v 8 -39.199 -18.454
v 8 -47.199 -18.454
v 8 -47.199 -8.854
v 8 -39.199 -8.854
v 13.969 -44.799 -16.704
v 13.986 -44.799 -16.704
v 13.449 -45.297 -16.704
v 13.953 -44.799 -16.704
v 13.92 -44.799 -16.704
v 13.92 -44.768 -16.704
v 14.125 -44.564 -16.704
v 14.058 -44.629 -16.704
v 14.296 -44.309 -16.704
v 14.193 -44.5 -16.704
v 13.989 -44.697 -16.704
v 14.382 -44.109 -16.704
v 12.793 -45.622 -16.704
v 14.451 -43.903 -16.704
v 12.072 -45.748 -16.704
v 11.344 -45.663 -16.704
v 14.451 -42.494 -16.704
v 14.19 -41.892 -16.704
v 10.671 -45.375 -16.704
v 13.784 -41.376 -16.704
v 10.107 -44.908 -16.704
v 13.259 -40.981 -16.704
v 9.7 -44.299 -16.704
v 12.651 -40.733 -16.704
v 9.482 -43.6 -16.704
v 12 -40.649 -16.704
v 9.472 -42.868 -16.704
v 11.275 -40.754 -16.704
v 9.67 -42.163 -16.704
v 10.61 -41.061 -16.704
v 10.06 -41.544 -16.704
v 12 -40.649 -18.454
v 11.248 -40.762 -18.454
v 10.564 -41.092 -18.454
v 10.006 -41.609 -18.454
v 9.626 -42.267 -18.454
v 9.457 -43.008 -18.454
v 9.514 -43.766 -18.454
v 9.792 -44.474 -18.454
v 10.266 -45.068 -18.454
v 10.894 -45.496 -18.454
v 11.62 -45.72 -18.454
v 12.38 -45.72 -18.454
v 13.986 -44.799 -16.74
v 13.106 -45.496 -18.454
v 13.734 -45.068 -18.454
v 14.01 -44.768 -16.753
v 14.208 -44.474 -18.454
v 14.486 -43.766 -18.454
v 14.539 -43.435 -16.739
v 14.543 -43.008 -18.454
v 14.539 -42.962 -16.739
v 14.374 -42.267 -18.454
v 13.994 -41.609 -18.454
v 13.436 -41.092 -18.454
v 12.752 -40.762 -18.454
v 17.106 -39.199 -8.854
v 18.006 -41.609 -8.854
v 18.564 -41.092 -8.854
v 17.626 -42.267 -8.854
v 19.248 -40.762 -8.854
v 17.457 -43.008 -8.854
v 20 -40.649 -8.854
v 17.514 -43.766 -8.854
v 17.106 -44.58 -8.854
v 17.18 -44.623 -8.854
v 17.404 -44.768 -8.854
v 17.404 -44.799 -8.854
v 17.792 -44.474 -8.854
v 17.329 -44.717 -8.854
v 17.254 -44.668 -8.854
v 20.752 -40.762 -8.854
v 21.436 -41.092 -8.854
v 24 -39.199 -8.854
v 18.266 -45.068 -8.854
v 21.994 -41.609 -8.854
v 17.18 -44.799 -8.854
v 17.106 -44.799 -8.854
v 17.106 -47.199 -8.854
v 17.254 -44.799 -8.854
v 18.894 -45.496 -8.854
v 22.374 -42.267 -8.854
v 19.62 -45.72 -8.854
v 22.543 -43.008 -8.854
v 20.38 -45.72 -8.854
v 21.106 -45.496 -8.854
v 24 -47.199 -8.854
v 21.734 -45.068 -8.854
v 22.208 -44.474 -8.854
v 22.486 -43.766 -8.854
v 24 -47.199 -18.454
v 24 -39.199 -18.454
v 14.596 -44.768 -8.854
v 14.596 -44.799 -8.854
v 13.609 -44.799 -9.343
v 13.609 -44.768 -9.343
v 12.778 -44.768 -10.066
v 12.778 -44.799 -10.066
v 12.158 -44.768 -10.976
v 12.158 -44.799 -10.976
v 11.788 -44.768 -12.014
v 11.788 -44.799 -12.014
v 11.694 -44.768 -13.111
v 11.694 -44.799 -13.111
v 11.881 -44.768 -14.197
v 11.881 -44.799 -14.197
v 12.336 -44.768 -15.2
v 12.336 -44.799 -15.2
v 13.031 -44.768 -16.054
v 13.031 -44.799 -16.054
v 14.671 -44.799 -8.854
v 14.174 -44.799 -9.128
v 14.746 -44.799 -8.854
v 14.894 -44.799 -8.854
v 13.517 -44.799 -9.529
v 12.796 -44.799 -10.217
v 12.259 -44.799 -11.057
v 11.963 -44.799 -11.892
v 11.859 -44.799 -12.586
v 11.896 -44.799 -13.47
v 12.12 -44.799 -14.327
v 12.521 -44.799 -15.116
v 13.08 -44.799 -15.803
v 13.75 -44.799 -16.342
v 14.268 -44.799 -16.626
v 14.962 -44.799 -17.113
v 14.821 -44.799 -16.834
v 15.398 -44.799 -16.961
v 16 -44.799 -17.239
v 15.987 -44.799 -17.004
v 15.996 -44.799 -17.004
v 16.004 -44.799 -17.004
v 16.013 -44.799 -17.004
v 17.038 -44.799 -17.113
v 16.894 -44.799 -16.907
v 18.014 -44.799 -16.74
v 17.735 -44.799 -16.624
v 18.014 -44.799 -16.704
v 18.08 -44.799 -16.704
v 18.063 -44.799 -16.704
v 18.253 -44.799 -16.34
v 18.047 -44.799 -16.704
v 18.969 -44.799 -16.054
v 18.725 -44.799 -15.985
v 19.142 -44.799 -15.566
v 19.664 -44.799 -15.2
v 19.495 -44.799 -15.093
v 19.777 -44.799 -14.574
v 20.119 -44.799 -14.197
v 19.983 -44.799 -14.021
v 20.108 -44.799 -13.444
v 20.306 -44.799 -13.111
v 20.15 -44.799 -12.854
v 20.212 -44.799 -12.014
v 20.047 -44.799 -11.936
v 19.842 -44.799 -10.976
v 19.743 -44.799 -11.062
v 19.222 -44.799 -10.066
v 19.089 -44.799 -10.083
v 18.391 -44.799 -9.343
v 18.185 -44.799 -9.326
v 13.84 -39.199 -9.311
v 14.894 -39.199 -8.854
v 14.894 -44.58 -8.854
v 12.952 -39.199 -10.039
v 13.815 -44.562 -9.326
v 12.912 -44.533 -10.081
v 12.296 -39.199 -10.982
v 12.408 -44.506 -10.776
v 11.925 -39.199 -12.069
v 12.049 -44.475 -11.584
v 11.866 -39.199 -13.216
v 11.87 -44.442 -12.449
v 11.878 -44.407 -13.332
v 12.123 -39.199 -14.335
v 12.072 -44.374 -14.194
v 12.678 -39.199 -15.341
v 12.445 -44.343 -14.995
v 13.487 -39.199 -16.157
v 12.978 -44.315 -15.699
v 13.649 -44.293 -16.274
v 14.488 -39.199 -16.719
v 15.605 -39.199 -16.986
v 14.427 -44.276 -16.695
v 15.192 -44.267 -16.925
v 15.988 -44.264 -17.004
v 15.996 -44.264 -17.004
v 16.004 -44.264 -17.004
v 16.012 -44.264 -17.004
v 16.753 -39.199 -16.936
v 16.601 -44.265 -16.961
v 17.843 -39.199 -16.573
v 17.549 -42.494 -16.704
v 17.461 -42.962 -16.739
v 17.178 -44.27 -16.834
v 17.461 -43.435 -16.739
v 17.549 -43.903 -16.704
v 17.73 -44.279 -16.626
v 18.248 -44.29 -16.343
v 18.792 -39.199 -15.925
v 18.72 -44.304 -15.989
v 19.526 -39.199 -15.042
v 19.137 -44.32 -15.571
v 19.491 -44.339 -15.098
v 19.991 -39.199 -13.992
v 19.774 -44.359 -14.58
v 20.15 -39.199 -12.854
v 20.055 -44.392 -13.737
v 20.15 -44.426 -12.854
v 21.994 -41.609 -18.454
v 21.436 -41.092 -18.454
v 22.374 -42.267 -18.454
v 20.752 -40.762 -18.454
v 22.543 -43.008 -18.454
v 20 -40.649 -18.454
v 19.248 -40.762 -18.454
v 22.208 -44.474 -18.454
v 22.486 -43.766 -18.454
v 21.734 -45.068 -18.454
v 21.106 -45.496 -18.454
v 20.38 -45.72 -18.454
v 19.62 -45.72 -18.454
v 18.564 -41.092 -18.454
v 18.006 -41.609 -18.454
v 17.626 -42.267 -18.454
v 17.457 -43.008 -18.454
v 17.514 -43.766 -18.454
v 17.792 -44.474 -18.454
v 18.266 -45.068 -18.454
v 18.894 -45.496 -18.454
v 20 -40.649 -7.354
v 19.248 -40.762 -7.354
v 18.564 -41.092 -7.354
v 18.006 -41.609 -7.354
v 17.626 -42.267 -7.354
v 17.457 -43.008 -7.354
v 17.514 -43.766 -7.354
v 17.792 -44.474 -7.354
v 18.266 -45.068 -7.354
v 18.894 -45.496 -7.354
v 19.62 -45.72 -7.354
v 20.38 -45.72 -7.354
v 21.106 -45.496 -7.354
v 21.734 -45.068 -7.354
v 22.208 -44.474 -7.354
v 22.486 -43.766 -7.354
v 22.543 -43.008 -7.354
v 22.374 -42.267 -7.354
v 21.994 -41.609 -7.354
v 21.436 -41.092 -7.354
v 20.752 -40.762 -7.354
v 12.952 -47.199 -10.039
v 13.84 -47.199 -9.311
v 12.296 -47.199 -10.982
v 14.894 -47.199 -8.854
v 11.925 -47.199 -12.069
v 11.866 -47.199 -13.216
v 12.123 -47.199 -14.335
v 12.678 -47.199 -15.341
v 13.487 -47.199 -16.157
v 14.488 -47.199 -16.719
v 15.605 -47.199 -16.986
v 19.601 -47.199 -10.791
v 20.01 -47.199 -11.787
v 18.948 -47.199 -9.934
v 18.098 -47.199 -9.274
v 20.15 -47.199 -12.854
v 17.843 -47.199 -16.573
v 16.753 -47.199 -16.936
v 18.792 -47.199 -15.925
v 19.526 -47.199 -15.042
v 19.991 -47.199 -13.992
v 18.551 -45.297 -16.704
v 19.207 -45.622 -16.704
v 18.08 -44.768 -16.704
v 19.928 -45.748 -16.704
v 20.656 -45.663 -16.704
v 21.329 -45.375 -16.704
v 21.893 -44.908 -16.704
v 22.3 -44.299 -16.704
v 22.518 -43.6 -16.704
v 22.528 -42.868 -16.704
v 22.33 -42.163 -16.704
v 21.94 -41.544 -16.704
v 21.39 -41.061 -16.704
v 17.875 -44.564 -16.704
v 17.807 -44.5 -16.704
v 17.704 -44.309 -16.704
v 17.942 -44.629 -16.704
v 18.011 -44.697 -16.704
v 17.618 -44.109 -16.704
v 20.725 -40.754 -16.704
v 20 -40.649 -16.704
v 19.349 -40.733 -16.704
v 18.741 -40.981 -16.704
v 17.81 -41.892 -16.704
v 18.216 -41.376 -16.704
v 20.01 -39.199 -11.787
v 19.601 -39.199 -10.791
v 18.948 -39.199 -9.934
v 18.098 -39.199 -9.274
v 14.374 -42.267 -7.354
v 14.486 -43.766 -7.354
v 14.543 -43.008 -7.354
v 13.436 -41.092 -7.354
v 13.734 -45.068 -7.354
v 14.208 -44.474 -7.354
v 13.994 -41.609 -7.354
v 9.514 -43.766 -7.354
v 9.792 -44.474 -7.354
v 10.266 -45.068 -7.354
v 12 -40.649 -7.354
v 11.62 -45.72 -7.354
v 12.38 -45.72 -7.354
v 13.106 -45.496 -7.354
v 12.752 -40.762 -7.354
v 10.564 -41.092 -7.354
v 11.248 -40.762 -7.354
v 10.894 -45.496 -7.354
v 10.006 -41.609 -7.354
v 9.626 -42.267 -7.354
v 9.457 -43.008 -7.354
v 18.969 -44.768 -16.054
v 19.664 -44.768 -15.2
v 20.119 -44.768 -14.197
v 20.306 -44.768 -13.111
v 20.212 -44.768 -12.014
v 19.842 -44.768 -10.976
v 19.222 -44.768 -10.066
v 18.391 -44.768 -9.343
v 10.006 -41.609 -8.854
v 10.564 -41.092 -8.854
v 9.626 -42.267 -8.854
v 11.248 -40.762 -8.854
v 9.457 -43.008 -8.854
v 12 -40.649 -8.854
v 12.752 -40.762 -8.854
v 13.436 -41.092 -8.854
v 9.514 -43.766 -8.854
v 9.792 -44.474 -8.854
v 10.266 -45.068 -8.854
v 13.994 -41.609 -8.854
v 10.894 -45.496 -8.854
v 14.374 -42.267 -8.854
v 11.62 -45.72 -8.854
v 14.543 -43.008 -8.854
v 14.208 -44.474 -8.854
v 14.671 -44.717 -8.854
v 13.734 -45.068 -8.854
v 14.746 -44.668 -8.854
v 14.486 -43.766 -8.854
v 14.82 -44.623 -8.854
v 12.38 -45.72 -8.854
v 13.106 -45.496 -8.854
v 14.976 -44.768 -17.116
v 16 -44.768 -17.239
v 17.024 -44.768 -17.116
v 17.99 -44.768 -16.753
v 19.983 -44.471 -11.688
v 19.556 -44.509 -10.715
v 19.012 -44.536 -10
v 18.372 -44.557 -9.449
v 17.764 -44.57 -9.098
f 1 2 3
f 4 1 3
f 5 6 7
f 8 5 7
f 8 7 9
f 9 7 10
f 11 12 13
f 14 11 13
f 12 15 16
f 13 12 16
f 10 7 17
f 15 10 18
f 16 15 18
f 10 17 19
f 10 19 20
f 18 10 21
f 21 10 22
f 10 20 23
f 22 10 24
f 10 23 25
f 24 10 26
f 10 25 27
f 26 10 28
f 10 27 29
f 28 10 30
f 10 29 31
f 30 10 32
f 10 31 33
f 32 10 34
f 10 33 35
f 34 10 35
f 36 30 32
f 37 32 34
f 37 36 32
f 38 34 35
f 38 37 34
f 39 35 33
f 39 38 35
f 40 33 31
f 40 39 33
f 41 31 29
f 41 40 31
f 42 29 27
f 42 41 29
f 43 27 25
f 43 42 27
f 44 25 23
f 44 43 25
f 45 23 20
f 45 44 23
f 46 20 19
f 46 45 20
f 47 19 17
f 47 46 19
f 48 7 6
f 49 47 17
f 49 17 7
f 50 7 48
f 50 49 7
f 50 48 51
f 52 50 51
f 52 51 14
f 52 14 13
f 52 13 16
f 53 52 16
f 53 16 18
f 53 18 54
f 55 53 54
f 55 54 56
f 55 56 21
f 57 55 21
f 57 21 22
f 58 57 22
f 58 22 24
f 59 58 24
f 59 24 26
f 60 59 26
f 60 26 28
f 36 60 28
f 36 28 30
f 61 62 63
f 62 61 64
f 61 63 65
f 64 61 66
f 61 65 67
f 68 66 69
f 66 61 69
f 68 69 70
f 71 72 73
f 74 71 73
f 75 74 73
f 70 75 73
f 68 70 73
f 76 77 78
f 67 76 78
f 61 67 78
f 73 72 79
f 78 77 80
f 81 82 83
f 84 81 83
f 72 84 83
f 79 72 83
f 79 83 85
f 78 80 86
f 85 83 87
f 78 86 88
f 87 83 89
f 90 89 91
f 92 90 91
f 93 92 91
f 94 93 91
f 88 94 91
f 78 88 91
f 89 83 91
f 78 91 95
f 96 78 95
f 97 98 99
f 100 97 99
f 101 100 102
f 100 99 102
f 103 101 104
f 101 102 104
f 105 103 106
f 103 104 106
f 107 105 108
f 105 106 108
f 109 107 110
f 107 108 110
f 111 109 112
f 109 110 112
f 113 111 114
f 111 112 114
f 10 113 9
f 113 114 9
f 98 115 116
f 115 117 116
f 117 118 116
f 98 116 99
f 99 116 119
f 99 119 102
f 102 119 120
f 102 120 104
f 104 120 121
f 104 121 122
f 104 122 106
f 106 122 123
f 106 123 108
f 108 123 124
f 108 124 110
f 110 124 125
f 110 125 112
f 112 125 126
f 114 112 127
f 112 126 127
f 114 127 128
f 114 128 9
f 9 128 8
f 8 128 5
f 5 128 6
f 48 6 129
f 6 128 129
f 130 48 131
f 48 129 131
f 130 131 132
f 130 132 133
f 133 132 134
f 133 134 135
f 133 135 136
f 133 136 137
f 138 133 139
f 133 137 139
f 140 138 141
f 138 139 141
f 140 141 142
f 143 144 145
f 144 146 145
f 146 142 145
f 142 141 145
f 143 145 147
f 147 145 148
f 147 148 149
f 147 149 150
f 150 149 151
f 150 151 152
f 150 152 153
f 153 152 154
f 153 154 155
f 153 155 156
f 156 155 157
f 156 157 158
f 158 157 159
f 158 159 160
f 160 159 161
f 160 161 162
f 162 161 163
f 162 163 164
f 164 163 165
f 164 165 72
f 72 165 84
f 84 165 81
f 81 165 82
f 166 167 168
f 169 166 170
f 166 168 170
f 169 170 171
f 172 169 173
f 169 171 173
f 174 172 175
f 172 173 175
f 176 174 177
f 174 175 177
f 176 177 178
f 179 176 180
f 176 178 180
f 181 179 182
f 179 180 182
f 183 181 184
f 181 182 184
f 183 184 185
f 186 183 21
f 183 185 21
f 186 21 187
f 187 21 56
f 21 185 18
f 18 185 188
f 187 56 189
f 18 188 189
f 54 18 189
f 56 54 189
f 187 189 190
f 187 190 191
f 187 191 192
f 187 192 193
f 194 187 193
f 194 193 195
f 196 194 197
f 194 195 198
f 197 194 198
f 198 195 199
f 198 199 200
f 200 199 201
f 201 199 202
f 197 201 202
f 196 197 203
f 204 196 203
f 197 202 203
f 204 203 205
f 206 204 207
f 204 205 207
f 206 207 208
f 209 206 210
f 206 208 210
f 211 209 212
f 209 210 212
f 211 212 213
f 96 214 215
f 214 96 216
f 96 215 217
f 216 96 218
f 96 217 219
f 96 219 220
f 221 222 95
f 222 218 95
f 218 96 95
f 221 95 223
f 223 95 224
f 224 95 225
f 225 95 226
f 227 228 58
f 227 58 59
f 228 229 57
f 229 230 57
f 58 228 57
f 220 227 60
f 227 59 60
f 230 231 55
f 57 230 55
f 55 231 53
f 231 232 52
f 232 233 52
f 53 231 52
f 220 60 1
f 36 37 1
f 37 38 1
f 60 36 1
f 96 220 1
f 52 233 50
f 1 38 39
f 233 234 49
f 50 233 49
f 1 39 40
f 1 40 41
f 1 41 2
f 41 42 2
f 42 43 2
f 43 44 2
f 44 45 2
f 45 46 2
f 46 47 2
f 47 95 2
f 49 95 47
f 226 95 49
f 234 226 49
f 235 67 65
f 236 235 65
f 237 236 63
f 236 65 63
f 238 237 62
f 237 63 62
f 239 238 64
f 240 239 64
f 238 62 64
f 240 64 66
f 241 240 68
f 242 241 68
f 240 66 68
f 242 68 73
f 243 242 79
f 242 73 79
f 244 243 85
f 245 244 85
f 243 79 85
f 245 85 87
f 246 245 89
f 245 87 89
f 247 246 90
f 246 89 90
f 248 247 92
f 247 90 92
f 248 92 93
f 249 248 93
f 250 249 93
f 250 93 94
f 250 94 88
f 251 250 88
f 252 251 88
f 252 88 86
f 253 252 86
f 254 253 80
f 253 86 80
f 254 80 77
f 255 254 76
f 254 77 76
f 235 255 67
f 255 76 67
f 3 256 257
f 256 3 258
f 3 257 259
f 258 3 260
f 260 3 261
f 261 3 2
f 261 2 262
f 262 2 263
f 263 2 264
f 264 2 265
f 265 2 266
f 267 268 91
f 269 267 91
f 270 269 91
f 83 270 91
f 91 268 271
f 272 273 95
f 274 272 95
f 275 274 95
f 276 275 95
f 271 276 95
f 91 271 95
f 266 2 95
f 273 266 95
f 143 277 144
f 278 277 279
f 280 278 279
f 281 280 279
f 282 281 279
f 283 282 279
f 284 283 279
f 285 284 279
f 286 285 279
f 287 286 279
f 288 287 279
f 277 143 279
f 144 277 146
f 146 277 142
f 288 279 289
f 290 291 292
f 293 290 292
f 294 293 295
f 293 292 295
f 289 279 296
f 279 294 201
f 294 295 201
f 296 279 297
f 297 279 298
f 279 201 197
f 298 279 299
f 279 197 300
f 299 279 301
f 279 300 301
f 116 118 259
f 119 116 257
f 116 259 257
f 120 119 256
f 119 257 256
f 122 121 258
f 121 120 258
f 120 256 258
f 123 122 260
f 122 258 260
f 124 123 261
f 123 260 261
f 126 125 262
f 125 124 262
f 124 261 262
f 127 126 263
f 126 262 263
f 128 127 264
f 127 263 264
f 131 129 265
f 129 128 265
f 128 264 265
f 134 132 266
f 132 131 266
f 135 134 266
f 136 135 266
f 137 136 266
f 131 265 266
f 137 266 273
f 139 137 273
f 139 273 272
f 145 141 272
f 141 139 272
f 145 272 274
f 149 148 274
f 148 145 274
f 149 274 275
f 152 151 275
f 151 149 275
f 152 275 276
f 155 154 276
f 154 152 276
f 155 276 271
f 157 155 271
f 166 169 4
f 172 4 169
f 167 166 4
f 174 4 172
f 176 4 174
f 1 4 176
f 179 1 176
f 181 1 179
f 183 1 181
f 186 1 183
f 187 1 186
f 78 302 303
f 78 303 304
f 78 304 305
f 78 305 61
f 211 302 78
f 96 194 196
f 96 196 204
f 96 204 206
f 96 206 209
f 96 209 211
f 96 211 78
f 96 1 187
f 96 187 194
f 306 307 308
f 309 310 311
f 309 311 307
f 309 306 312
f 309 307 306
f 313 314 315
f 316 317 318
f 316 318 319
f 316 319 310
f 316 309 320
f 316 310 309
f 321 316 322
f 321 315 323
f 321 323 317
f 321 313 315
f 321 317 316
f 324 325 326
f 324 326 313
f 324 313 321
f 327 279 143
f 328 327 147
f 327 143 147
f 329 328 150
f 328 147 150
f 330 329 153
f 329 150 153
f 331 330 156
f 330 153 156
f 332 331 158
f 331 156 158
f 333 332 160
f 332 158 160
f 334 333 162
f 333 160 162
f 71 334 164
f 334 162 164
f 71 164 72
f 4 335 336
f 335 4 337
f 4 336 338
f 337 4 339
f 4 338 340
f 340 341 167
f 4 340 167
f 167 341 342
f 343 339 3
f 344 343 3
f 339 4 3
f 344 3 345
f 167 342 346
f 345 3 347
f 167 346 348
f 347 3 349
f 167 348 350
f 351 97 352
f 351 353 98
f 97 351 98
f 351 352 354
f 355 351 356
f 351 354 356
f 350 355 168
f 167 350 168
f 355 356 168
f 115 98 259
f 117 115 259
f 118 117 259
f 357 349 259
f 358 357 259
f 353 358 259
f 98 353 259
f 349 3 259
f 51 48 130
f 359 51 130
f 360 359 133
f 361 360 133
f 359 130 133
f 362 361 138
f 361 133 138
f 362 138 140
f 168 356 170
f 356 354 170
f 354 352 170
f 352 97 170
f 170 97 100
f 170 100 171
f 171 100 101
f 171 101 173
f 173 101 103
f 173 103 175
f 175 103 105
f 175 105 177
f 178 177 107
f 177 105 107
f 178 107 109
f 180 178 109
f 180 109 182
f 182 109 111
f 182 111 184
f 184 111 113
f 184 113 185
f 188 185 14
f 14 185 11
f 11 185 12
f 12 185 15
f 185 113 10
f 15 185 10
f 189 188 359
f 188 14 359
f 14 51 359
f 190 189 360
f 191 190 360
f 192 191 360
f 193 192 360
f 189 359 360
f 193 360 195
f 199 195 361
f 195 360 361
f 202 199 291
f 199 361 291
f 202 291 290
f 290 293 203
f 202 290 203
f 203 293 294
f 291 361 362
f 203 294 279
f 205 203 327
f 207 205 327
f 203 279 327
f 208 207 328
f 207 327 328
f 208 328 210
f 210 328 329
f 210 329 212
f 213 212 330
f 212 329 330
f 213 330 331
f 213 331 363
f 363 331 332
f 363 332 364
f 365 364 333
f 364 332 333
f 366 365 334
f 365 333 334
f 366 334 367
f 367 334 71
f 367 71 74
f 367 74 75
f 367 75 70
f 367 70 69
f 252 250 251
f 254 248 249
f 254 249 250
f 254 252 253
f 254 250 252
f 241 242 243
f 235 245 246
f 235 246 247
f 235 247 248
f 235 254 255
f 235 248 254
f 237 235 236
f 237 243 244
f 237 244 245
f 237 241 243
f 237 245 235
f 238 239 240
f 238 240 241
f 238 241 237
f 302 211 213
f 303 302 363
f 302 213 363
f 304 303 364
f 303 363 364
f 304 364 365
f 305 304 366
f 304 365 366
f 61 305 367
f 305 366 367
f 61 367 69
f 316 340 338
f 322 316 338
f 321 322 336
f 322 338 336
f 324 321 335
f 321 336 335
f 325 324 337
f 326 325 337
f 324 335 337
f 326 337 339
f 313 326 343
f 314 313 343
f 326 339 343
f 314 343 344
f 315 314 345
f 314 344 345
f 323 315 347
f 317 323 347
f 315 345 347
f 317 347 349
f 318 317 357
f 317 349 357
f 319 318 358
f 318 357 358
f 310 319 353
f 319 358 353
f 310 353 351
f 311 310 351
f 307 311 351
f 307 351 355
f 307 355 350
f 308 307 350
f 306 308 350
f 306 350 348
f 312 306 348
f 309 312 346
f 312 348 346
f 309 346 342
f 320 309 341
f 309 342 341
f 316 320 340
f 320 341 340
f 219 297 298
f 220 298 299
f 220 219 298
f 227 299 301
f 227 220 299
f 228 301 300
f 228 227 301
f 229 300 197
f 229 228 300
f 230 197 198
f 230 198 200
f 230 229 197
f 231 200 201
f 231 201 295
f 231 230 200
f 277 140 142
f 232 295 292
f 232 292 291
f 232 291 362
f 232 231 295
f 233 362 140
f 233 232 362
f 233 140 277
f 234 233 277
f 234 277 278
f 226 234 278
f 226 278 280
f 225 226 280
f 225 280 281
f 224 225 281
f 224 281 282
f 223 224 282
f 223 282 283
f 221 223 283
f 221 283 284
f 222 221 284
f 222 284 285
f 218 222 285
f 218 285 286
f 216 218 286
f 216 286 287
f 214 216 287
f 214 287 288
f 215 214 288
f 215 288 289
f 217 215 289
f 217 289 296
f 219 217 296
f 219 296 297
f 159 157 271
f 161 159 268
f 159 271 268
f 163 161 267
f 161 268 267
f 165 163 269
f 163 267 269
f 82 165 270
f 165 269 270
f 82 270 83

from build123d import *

# Parameters (mm, degrees)
BOSS_EXTRUDE1_DEPTH = 8
SKETCH3_R           = 2.55
BOSS_EXTRUDE2_DEPTH = 1.5
CUT_EXTRUDE1_START  = -9.6
SKETCH3_3_R         = 2.55
CUT_EXTRUDE1_DEPTH  = 1.75


with BuildPart() as part:
    # Sketch1 → Boss-Extrude1 (new body)
    with BuildSketch(Plane(origin=(0, -47.198737708, 1.758e-06), x_dir=(1, 0, 0), z_dir=(1.517238059440084e-15, 0.9999999999999994, -3.725290356966477e-08))):
        with BuildLine():
            Line((7.999998093, 18.45445013), (7.999998093, 8.85445013))
            Line((7.999998093, 8.85445013), (14.894330873, 8.85445013))
            ThreePointArc((14.894330873, 8.85445013), (13.486635699, 16.156799215), (20.149998093, 12.85445013))
            ThreePointArc((20.149998093, 12.85445013), (19.302347178, 10.341087736), (17.105665312, 8.85445013))
            Line((17.105665312, 8.85445013), (23.999998093, 8.85445013))
            Line((23.999998093, 8.85445013), (23.999998093, 18.45445013))
            Line((23.999998093, 18.45445013), (7.999998093, 18.45445013))
        make_face()
    extrude(amount=BOSS_EXTRUDE1_DEPTH)

    # Sketch2 → Cut-Revolve1 (revolve, cut)
    with BuildSketch(Plane.ZY.offset(-15.999998093)):
        Polygon((-8.854448524, -44.263738058), (-8.619448462, -44.767697268), (-8.619448461, -44.798738029), (-8.854448524, -44.798738345), align=None)
    revolve(axis=Axis((15.999998093, -46.259040624, -12.929448669), (0, -1, 0)), mode=Mode.SUBTRACT)

    # Sketch3 → Boss-Extrude2 (add)
    with BuildSketch(Plane(origin=(0, -3.3e-07, -8.85445013), x_dir=(1, 0, 0), z_dir=(0, 3.725290356966478e-08, 0.9999999999999994))):
        with Locations(Location((11.999998093, -43.198737708, 0), (0, 0, 90))):
            Circle(SKETCH3_R)
        with Locations(Location((19.999998093, -43.198737708, 0), (0, 0, 90))):
            Circle(SKETCH3_R)
    extrude(amount=BOSS_EXTRUDE2_DEPTH)

    # Sketch3<3> → Cut-Extrude1 (cut)
    with BuildSketch(Plane(origin=(0, -3.3e-07, -8.85445013), x_dir=(1, 0, 0), z_dir=(0, 3.725290356966478e-08, 0.9999999999999994)).offset(CUT_EXTRUDE1_START)):
        with Locations(Location((11.999998093, -43.198737708, 0), (0, 0, 90))):
            Circle(SKETCH3_3_R)
        with Locations(Location((19.999998093, -43.198737708, 0), (0, 0, 90))):
            Circle(SKETCH3_3_R)
    extrude(amount=CUT_EXTRUDE1_DEPTH, mode=Mode.SUBTRACT)


solid = part.part
